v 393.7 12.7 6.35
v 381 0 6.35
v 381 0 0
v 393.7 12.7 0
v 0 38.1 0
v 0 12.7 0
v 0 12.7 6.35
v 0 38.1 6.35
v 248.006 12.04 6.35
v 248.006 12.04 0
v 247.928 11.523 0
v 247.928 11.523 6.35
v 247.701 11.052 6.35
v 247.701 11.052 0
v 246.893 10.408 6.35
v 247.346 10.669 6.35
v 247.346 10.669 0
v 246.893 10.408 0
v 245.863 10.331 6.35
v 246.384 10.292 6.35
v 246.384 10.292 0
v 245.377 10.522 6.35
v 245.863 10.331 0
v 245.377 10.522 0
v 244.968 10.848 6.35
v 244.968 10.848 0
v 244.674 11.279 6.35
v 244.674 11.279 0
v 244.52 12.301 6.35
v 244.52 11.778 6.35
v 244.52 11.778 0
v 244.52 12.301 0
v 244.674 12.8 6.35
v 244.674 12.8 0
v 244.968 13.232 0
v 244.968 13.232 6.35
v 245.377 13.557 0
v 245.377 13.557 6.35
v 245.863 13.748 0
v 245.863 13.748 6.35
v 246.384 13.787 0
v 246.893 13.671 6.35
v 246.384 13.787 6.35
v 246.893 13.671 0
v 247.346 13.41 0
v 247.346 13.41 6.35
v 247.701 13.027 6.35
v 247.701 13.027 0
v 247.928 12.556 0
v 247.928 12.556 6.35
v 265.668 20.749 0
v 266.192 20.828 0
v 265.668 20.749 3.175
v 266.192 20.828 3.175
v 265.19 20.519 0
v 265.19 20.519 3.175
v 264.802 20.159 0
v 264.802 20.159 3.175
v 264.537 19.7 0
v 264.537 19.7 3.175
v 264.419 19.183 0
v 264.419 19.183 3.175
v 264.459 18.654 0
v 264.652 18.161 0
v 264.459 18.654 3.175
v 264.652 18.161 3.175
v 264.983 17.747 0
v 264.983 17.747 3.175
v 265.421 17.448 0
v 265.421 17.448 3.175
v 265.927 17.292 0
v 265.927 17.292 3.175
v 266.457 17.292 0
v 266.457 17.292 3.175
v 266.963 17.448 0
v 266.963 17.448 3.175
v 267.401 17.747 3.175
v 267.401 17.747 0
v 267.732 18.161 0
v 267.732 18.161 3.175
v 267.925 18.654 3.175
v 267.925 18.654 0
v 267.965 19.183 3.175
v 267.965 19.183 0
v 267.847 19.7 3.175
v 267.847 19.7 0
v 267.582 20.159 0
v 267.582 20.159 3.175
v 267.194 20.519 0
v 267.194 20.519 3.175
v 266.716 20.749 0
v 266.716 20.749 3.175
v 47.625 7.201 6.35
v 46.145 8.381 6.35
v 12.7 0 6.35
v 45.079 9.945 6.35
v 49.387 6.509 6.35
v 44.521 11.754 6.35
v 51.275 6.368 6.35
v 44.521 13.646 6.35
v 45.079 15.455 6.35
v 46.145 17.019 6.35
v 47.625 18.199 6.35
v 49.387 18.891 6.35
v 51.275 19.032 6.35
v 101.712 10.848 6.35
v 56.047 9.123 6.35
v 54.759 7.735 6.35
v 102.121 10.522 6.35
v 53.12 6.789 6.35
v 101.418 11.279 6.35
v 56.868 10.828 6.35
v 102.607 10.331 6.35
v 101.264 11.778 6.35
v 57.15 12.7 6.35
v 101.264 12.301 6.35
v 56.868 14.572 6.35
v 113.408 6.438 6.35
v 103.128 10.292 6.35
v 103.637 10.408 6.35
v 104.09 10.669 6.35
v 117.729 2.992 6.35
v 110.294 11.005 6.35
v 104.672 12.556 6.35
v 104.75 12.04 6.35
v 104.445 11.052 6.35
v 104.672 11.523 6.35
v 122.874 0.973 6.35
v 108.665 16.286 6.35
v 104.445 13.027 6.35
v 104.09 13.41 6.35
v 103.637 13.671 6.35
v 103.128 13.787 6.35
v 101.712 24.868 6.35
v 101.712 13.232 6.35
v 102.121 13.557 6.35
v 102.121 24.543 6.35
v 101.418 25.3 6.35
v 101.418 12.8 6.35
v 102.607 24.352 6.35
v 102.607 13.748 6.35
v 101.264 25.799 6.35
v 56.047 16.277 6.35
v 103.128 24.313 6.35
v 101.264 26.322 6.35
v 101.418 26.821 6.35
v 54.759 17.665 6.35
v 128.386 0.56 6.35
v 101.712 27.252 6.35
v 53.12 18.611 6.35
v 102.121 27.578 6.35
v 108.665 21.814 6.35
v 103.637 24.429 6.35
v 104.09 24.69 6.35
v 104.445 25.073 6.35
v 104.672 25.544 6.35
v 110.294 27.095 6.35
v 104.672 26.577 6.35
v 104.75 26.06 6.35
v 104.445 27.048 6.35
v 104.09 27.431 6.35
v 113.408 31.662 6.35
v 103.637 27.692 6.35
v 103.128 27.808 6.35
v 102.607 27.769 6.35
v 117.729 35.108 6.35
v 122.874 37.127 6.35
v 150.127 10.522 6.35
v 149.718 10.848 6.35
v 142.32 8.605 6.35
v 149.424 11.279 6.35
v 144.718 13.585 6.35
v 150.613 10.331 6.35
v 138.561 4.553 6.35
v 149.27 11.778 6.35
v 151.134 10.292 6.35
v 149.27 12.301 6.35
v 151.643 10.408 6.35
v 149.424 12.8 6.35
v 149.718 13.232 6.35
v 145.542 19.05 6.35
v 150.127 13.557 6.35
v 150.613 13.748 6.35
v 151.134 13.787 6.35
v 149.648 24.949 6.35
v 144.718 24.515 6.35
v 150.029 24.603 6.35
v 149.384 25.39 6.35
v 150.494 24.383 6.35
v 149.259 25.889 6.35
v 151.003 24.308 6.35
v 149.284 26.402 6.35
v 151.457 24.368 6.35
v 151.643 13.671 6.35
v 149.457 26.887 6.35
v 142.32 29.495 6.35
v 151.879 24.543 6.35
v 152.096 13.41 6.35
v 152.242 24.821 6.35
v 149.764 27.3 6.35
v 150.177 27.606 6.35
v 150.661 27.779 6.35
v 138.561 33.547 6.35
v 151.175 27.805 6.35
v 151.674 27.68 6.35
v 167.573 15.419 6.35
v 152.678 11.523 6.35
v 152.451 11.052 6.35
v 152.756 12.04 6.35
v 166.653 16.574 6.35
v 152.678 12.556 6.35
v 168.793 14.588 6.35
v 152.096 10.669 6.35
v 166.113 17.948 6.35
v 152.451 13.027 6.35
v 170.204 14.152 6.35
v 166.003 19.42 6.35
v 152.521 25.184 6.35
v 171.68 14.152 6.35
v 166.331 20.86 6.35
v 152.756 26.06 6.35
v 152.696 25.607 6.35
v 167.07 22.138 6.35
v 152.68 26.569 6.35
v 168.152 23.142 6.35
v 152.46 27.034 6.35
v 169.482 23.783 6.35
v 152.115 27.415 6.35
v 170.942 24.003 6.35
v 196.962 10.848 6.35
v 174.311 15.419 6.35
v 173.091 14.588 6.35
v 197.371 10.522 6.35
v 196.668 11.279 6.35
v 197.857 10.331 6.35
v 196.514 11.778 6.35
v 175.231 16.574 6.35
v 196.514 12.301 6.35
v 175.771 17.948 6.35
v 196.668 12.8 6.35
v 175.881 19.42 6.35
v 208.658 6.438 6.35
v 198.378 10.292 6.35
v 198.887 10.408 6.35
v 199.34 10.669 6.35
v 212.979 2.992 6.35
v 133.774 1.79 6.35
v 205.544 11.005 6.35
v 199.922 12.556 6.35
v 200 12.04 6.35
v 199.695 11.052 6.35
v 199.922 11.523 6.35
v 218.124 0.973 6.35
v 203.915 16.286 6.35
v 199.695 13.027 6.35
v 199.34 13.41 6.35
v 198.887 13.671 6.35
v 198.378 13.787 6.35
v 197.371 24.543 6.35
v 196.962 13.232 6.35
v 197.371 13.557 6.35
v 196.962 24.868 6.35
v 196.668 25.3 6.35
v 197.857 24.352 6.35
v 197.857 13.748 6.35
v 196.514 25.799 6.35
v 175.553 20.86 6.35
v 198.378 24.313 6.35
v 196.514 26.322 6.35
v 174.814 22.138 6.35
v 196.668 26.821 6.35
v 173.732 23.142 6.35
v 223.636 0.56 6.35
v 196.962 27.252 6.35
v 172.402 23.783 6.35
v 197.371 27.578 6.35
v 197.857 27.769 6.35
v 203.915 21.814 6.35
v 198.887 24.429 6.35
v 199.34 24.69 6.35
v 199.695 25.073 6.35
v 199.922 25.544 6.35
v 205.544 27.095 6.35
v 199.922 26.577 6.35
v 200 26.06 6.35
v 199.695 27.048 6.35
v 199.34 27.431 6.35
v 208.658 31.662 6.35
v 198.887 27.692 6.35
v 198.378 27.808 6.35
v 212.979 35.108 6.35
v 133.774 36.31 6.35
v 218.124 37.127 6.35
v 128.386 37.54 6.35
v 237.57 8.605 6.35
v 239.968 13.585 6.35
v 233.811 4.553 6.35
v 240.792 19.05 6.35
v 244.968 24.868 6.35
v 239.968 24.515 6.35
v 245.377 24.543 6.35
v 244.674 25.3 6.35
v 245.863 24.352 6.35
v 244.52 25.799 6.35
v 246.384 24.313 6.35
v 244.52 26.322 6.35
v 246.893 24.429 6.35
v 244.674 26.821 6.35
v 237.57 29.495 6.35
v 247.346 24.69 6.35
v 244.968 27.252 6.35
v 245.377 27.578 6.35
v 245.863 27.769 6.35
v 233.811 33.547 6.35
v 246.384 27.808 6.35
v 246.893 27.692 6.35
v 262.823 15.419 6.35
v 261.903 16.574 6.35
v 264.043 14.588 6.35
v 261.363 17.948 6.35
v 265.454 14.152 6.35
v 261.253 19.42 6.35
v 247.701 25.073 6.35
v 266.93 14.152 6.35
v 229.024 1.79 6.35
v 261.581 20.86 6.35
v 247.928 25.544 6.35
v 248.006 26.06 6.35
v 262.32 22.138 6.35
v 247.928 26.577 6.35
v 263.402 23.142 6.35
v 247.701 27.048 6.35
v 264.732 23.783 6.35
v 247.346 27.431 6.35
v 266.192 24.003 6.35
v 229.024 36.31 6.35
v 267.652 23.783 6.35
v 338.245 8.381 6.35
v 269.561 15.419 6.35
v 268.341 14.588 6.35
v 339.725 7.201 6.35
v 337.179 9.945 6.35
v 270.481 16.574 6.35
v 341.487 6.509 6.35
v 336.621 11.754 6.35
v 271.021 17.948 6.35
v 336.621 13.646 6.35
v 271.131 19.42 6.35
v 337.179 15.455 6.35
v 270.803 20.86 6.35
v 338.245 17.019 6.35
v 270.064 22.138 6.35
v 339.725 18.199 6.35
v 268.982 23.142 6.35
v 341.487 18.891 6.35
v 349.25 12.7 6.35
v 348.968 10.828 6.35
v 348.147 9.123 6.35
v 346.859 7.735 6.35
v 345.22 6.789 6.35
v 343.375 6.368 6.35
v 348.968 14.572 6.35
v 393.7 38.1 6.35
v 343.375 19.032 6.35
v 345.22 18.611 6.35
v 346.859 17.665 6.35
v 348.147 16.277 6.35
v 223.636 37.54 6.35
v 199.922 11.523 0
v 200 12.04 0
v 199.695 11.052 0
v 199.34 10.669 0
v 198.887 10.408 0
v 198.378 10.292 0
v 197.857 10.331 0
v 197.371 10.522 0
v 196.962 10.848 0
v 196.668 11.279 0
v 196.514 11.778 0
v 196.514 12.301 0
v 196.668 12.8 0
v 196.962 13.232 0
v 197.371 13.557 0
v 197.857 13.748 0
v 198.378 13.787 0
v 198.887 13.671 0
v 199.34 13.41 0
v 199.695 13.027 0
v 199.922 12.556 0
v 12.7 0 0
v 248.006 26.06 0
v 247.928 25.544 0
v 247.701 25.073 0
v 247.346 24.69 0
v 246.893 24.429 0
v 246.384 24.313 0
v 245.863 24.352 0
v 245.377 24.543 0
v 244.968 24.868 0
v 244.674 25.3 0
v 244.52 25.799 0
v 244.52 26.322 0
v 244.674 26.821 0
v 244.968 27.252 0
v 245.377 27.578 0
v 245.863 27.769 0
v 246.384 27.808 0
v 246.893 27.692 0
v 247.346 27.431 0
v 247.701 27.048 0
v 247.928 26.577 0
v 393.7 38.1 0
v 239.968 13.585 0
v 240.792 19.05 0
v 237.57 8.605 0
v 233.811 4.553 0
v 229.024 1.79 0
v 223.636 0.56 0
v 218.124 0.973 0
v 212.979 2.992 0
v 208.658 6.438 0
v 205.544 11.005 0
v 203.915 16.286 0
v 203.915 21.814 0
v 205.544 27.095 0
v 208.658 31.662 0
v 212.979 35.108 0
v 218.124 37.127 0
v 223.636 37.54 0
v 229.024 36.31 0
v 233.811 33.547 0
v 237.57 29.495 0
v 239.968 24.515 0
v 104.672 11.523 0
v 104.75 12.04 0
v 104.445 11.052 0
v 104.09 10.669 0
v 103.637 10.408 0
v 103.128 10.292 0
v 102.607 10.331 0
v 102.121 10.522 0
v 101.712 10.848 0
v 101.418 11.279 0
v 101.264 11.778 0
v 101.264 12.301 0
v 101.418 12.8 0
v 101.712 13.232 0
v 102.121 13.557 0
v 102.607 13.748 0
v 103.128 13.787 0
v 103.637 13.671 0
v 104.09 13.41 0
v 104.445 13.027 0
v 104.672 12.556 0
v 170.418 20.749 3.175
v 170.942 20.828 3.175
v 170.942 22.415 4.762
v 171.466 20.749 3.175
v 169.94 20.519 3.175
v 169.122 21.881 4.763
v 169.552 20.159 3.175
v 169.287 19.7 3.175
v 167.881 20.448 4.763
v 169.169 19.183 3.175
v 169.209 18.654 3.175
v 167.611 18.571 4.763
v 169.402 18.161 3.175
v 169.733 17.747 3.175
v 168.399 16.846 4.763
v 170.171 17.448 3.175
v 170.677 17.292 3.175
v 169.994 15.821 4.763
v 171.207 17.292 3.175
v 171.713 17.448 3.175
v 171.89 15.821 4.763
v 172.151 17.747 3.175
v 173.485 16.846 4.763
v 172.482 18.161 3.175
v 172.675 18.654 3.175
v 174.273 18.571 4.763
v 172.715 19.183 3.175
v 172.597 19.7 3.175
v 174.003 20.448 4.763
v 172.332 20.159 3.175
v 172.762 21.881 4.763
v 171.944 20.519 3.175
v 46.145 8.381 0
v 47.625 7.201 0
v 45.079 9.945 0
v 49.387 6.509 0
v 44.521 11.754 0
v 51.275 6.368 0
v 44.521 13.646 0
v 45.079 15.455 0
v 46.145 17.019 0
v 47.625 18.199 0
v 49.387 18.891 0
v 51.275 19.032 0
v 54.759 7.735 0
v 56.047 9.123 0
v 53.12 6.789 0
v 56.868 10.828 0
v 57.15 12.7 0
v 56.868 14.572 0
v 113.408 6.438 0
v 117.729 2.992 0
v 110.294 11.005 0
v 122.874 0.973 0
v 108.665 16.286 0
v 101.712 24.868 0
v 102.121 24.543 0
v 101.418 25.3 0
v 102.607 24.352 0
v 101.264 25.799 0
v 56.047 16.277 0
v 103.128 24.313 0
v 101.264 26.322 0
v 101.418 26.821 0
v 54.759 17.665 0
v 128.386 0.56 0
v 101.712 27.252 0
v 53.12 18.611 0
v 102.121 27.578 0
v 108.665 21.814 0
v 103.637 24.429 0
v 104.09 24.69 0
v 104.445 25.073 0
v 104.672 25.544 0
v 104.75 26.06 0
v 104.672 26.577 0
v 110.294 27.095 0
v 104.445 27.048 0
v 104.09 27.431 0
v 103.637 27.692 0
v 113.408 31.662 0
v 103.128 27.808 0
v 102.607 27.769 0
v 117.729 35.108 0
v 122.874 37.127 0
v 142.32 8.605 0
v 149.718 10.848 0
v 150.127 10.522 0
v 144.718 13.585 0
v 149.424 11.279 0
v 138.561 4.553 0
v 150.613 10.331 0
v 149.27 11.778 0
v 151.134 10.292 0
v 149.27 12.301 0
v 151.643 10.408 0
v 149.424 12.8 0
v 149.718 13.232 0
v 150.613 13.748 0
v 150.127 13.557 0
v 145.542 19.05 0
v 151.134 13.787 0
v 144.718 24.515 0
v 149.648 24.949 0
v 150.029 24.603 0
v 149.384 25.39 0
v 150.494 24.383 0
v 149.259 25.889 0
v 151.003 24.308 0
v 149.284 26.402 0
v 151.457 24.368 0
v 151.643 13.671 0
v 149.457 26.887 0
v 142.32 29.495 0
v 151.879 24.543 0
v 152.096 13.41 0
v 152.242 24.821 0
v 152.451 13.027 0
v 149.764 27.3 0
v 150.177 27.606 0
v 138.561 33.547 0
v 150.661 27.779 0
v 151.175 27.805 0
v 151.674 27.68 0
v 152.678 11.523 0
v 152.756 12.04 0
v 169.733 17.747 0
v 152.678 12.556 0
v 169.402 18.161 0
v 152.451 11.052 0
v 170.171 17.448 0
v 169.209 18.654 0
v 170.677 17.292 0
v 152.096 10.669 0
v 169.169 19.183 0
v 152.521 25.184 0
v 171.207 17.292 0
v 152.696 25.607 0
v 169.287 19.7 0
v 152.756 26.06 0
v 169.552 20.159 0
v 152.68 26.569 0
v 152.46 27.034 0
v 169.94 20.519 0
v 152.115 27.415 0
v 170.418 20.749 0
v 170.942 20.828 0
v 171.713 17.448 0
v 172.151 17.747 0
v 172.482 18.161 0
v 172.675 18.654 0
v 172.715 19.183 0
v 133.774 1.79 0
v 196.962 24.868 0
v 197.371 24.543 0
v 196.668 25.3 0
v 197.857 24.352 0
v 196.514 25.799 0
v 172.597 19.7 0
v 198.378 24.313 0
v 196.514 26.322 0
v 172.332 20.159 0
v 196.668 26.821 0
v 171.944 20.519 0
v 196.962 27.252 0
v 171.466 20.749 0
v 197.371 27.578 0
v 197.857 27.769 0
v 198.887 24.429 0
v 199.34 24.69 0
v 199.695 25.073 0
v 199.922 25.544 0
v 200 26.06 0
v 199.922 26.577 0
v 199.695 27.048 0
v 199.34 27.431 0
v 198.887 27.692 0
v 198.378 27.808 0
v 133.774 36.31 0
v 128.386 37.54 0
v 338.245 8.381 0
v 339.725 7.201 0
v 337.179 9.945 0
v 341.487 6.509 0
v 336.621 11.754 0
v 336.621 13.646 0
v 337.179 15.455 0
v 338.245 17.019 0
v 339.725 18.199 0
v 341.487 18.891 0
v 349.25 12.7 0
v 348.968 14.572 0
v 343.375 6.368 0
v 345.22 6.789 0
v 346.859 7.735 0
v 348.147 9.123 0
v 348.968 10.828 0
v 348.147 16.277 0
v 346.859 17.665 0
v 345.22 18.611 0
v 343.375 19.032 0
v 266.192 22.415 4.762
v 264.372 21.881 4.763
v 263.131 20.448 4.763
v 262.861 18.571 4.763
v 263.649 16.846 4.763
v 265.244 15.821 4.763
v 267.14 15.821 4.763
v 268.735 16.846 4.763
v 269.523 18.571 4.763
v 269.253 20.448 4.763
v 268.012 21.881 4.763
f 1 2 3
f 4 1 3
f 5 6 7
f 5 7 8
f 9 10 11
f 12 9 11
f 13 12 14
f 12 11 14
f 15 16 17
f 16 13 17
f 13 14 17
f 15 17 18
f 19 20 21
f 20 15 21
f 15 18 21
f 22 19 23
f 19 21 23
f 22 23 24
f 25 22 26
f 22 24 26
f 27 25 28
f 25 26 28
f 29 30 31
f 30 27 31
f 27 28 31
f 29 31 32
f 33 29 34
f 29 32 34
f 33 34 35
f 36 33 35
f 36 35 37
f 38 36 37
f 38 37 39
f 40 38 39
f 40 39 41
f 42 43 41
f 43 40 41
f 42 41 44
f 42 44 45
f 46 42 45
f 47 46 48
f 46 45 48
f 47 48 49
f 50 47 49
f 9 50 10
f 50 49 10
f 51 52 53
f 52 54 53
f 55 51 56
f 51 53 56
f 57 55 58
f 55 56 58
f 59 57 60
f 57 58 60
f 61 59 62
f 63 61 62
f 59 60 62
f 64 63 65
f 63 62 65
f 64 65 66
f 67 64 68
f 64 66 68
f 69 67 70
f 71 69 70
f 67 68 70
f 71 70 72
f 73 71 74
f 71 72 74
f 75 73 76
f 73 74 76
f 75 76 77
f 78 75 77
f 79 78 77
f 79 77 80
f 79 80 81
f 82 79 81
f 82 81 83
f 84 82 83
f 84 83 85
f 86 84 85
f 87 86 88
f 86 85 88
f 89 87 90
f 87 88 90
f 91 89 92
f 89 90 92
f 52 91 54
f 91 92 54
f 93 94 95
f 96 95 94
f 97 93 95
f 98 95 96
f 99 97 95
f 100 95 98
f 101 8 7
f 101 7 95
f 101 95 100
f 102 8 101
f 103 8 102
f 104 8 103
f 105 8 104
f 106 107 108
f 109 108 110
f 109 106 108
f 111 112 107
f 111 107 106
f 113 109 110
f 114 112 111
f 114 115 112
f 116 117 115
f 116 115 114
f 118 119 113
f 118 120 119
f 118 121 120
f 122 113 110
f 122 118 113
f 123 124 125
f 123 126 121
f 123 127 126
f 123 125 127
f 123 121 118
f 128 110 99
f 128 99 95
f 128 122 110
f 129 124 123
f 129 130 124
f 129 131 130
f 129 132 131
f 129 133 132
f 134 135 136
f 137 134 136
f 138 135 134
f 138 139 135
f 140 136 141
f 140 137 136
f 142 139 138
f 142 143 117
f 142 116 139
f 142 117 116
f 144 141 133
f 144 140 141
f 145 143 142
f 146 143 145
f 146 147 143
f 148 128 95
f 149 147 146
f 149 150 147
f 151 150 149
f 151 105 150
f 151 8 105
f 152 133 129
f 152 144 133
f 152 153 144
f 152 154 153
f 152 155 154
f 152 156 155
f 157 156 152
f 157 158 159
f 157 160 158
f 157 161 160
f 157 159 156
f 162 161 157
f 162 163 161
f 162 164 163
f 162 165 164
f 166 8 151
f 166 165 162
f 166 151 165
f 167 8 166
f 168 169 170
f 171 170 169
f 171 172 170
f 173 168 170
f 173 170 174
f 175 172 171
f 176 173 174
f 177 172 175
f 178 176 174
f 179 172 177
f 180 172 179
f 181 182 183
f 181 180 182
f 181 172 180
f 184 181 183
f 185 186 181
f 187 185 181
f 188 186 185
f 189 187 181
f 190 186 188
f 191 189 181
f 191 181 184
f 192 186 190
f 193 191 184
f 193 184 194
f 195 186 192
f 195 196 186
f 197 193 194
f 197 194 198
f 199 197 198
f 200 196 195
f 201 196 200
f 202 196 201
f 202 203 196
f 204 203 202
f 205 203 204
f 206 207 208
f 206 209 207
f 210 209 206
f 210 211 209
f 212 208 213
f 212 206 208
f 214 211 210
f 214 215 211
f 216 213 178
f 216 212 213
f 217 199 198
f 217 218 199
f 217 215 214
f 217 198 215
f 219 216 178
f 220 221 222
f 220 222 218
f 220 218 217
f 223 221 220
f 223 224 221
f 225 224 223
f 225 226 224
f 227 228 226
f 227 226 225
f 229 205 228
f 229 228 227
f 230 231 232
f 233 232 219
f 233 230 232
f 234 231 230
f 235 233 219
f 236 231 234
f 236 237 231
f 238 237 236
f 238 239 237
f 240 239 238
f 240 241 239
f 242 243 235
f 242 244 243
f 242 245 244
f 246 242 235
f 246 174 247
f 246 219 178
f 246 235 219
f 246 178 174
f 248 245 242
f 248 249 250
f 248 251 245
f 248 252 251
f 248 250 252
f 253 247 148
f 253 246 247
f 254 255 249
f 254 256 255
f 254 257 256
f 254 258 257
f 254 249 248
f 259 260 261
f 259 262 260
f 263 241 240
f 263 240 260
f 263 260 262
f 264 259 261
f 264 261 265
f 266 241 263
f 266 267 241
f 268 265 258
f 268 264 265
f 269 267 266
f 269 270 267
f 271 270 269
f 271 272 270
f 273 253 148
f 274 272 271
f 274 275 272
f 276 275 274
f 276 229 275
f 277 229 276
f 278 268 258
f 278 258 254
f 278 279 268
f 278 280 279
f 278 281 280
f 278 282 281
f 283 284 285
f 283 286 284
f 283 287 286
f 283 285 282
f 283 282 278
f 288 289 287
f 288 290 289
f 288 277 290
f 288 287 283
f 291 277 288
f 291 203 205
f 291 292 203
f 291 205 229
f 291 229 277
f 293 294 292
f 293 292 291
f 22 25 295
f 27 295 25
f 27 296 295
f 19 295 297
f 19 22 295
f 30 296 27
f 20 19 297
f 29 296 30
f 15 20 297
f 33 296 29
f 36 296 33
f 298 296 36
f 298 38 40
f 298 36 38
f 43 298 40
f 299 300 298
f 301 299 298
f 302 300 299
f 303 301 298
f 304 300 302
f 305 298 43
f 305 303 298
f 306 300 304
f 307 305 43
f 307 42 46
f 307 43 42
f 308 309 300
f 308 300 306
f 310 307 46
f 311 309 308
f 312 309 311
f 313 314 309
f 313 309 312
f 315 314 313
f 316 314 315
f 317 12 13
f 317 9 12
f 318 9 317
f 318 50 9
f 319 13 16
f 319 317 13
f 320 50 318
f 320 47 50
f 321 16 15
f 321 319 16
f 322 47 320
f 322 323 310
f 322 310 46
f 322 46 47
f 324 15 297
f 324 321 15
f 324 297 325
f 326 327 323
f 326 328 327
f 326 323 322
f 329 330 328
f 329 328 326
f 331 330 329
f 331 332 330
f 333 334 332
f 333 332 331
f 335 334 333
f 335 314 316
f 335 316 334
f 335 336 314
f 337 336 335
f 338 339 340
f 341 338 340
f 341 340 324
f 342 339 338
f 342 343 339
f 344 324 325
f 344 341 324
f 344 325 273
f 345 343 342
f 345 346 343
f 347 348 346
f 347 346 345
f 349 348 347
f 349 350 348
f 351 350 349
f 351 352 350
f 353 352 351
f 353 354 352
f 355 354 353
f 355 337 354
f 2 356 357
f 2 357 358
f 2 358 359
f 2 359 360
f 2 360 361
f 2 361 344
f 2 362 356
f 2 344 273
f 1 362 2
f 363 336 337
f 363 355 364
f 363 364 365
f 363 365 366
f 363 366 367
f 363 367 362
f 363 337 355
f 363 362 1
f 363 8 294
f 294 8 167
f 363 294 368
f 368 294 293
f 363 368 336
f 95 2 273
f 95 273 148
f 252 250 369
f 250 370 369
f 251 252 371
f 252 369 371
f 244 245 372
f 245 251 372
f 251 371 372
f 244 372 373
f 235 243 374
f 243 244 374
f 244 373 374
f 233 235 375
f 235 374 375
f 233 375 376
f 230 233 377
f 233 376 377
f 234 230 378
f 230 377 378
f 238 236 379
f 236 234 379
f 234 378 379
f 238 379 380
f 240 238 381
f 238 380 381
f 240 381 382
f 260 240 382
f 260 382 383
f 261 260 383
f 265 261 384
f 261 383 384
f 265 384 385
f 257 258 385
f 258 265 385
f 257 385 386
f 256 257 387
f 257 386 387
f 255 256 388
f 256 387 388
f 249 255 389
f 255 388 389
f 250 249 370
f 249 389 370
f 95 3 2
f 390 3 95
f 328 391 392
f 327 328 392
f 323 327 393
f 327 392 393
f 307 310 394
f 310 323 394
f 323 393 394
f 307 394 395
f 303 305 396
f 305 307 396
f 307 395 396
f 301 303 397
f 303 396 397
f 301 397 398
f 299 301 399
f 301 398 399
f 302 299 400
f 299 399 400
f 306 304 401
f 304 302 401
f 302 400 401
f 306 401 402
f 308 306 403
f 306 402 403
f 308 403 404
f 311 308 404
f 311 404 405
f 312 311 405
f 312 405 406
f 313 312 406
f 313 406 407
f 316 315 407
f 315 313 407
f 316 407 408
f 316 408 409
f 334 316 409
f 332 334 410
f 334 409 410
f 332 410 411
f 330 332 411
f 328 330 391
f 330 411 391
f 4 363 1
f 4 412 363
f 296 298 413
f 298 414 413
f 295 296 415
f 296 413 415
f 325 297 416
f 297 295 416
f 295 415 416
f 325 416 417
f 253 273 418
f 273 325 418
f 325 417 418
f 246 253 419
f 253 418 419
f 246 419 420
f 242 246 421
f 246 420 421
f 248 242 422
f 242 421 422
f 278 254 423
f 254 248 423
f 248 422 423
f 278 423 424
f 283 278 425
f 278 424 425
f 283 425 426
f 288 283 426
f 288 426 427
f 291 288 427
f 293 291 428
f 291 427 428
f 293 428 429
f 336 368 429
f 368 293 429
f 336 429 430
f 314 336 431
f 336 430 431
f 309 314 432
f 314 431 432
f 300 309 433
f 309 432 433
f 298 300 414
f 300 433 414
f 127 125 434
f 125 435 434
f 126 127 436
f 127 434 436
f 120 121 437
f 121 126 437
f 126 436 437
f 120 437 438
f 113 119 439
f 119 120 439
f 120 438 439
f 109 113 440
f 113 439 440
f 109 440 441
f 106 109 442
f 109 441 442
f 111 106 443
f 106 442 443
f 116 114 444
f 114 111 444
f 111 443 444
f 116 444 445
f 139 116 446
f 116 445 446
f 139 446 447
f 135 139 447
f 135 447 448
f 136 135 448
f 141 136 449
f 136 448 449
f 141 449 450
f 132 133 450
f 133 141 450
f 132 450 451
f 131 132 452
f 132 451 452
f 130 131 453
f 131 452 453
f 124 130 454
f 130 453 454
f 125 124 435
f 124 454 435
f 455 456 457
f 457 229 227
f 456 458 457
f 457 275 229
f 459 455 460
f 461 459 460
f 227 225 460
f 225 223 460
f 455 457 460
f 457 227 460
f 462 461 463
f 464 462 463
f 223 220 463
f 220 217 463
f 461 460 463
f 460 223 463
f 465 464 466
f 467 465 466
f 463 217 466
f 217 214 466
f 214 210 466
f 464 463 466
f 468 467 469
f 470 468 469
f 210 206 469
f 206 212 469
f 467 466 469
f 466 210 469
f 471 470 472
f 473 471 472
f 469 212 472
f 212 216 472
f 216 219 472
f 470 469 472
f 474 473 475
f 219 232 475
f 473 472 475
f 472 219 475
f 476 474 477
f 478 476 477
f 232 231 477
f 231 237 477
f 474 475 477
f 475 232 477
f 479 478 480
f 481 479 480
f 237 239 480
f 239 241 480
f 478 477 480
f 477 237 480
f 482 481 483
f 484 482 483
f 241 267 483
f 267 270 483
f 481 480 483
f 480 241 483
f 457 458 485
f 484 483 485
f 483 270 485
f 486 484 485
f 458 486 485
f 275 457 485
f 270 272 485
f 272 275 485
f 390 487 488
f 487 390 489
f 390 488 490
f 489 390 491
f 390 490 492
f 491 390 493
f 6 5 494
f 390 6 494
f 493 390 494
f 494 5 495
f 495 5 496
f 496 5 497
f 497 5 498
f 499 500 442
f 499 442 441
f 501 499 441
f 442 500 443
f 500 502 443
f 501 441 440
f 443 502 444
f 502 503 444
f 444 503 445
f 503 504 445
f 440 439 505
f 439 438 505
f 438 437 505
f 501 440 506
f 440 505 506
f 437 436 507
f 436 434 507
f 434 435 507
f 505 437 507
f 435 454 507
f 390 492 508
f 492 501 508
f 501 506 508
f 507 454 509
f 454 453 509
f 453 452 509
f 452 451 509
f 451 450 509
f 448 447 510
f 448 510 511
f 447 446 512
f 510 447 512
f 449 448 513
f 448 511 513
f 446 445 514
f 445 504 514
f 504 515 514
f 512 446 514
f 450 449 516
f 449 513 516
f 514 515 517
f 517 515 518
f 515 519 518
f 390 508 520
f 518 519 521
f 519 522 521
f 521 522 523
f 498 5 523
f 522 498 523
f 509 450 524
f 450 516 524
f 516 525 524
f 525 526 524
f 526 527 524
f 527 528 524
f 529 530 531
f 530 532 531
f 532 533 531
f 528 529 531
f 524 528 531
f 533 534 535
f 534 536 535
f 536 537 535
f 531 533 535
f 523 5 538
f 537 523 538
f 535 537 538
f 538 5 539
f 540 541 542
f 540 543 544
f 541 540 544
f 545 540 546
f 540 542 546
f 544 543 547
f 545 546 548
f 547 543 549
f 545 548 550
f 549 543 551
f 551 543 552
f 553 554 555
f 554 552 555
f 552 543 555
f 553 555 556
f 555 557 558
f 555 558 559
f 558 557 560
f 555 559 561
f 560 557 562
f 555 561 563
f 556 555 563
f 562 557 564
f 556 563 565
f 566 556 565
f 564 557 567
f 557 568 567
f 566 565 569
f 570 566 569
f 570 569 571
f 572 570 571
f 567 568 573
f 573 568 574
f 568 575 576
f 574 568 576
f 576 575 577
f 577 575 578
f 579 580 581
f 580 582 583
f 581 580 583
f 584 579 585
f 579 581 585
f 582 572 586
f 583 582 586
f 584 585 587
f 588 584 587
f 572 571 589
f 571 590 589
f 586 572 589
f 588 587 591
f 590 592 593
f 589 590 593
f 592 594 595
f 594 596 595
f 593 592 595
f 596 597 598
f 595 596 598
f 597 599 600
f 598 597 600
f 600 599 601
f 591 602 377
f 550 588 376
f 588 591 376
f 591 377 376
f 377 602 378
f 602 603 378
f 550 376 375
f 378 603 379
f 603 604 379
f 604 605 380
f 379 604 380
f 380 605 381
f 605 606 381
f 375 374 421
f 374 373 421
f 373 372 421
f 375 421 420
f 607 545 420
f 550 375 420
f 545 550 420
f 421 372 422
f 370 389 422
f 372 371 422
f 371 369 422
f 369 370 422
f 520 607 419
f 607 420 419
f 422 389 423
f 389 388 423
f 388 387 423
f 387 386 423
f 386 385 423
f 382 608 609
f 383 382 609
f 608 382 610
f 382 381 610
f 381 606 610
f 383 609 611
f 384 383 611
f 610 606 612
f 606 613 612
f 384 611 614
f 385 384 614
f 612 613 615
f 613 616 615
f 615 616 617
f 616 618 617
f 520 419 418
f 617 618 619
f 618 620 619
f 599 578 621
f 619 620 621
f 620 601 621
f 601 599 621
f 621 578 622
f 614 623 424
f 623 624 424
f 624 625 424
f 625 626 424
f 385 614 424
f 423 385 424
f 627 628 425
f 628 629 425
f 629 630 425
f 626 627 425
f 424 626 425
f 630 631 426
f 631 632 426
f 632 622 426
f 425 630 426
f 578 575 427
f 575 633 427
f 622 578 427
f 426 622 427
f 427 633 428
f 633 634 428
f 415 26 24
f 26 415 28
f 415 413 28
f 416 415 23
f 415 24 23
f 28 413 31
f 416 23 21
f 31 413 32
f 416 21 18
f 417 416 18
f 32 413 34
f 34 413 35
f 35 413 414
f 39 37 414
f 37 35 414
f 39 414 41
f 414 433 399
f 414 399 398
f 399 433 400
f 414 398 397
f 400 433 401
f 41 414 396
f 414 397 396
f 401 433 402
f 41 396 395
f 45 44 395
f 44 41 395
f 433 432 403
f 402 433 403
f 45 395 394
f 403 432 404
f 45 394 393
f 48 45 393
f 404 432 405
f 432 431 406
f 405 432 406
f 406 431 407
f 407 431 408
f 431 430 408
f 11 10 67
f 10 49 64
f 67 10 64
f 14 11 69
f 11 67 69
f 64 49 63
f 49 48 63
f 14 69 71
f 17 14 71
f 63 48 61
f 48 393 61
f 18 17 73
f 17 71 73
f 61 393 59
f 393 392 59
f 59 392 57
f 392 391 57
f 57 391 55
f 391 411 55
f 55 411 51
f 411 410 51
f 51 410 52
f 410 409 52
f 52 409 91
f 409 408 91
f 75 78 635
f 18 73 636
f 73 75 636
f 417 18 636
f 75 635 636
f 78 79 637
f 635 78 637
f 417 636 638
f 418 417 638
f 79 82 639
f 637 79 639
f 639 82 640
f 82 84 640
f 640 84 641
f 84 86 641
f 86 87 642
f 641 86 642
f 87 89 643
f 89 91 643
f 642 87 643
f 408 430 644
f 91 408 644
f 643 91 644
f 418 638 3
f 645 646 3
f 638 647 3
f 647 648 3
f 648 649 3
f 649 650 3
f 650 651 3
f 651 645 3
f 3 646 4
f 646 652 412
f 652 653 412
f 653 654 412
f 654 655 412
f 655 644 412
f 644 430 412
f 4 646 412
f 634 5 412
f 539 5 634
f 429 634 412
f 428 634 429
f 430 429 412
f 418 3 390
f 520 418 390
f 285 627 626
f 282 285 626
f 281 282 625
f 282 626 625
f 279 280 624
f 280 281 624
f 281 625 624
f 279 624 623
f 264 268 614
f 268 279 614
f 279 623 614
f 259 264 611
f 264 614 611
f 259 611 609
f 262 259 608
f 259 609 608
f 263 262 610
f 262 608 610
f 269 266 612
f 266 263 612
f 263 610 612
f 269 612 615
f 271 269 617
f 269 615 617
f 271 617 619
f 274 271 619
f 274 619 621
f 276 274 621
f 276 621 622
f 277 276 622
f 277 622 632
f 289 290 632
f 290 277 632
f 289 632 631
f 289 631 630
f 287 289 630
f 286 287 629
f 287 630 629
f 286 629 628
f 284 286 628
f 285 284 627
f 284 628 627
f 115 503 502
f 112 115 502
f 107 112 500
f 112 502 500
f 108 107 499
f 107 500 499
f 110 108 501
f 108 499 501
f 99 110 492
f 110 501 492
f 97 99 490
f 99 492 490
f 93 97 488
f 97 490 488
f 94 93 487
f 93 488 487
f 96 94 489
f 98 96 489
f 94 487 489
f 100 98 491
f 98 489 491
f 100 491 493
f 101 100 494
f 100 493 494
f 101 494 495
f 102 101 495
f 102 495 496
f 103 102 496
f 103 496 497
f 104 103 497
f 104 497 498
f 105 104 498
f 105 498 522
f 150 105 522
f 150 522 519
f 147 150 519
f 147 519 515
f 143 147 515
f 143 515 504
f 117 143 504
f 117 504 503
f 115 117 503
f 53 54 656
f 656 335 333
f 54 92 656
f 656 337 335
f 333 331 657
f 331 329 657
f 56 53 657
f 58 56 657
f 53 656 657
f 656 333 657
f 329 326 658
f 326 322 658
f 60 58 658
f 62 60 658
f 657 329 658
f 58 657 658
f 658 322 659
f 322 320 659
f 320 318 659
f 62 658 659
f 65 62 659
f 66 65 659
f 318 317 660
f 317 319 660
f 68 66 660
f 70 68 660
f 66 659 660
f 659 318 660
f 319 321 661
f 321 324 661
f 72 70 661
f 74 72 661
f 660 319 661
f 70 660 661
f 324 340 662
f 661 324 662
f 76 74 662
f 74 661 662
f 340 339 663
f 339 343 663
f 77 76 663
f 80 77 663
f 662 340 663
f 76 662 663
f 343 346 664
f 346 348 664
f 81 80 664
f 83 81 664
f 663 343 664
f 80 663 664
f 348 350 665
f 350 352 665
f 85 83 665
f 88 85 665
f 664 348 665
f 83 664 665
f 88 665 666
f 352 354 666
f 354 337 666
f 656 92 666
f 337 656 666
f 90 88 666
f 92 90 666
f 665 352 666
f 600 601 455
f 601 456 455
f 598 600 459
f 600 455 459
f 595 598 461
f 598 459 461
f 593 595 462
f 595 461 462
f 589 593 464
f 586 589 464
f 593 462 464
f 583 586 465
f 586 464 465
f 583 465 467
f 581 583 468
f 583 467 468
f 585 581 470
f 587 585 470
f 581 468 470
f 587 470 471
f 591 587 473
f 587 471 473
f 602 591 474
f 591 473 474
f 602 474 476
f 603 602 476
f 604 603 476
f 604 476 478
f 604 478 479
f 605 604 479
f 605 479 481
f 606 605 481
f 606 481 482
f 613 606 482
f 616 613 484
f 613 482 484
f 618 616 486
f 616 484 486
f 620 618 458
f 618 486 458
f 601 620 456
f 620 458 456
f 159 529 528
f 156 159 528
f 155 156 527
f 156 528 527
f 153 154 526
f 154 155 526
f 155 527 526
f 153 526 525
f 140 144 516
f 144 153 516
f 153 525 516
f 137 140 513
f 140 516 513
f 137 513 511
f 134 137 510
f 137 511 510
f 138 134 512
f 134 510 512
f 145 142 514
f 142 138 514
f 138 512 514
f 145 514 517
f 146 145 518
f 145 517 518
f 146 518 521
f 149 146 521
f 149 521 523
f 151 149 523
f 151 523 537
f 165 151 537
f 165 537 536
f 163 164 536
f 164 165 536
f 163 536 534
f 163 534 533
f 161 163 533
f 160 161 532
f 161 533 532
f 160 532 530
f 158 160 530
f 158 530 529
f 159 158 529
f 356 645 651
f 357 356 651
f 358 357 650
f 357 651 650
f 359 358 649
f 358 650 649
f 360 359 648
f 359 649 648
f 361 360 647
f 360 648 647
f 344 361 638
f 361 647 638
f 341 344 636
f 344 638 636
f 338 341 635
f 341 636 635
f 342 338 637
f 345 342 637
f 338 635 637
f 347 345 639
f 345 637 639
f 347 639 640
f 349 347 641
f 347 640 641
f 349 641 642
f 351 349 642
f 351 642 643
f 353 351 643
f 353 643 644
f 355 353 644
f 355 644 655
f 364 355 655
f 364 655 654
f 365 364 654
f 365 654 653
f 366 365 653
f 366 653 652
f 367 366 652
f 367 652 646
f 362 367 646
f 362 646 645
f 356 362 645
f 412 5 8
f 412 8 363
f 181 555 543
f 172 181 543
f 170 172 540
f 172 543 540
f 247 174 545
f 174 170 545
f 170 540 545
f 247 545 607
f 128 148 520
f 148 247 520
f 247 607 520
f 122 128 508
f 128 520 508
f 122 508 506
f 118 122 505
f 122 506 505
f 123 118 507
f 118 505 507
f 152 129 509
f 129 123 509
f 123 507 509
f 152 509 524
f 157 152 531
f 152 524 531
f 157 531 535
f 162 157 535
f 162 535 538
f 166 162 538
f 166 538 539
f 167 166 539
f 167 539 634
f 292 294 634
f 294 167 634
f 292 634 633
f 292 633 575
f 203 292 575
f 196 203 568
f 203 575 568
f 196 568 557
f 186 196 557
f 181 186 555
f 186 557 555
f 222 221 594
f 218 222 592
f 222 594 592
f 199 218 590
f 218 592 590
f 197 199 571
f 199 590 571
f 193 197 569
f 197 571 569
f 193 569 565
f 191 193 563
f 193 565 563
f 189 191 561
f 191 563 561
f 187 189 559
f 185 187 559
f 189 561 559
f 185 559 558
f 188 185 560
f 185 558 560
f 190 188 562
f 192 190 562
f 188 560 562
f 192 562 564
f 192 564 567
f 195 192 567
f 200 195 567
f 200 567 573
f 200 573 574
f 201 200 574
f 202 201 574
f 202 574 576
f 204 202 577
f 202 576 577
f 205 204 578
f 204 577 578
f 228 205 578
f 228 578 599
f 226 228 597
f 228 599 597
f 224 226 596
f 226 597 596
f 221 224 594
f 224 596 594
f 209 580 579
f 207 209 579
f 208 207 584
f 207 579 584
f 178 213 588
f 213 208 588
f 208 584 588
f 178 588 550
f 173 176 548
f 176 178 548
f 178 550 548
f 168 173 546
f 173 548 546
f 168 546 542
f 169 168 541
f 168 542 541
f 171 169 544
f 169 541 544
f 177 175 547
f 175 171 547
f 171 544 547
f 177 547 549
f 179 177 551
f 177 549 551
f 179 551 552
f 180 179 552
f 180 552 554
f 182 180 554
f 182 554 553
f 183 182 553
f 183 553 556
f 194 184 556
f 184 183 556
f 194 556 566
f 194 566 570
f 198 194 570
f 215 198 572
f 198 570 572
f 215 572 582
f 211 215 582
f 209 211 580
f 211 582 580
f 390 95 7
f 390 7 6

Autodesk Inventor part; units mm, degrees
ref_plane "YZ Plane" through (0, 0, 0) normal (1, 0, 0) x (0, 1, 0)
ref_plane "XZ Plane" through (0, 0, 0) normal (0, 1, 0) x (-1, 0, 0)
ref_plane "XY Plane" through (0, 0, 0) normal (0, 0, 1) x (1, 0, 0)
sketch "Sketch1" plane through (0, 0, 0) normal (0, 0, 1) x (1, 0, 0)
  line L0 (0, 0) -> (0, 38.1)
  line L1 (0, 38.1) -> (393.7, 38.1)
  line L2 (393.7, 38.1) -> (393.7, 0)
  line L3 (393.7, 0) -> (0, 0)
  circle A0 centre (127, 19.05) radius 18.542
  circle A1 centre (222.25, 19.05) radius 18.542
  circle A2 centre (170.942, 19.05) radius 1.778
  circle A3 centre (266.192, 19.05) radius 1.778
  line L4 (151.003, 19.05) -> (151.003, 26.0604)
  circle A4 centre (102.997, 12.0396) radius 1.7526
  circle A5 centre (102.997, 26.0604) radius 1.7526
  circle A6 centre (151.003, 26.0604) radius 1.7526
  circle A7 centre (151.003, 12.0396) radius 1.7526
  line L5 (151.003, 19.05) -> (127, 19.05)
  circle A8 centre (246.253, 26.0604) radius 1.7526
  circle A9 centre (246.253, 12.0396) radius 1.7526
  circle A10 centre (198.247, 12.0396) radius 1.7526
  circle A11 centre (198.247, 26.0604) radius 1.7526
  circle A12 centre (50.8, 12.7) radius 6.35
  circle A13 centre (342.9, 12.7) radius 6.35
  dimension "d0" = 38.1
  dimension "d1" = 393.7
  dimension "d3" = 37.084
  dimension "d5" = 37.084
  dimension "d10" = 3.556
  dimension "d11" = 3.556
  dimension "d24" = 7.0104
  dimension "d28" = 3.5052
  dimension "d29" = 3.5052
  dimension "d30" = 3.5052
  dimension "d31" = 24.003
  dimension "d38" = 3.5052
  dimension "d39" = 3.5052
  dimension "d40" = 3.5052
  dimension "d41" = 3.5052
  dimension "d48" = 12.7
  dimension "d50" = 12.7
extrude "Extrusion1" add sketch "Sketch1" along normal blind 6.35 contours L0 L1 L2 L3 | A6 | A2 | A3 | A4 | A5 | A7 | A8 | A9 | A10 | A11 | A12 | A13
hole "Hole1" at (170.942, 19.05, 0) at (266.192, 19.05, 0) direction (0, 0, 1) diameter 3.556 end through all
chamfer "Chamfer1" distance 3.175 angle 45 2 edges at (170.942, 17.272, 6.35) (266.192, 17.272, 6.35)
extrude "Extrusion2" cut sketch "Sketch1" along normal blind 6.35 contours A8 | A9
extrude "Extrusion3" cut sketch "Sketch1" along normal blind 6.35 contours A6 | A4 | A5 | A7 | A10 | A11
extrude "Extrusion4" cut sketch "Sketch1" along normal blind 25.4 contours A12 | A13
chamfer "Chamfer2" distance 12.7 angle 45 1 edges at (0, 0, 3.175)
chamfer "Chamfer3" distance 12.7 angle 45 1 edges at (393.7, 0, 3.175)
properties part number "Drive Train - Smallest Model"
